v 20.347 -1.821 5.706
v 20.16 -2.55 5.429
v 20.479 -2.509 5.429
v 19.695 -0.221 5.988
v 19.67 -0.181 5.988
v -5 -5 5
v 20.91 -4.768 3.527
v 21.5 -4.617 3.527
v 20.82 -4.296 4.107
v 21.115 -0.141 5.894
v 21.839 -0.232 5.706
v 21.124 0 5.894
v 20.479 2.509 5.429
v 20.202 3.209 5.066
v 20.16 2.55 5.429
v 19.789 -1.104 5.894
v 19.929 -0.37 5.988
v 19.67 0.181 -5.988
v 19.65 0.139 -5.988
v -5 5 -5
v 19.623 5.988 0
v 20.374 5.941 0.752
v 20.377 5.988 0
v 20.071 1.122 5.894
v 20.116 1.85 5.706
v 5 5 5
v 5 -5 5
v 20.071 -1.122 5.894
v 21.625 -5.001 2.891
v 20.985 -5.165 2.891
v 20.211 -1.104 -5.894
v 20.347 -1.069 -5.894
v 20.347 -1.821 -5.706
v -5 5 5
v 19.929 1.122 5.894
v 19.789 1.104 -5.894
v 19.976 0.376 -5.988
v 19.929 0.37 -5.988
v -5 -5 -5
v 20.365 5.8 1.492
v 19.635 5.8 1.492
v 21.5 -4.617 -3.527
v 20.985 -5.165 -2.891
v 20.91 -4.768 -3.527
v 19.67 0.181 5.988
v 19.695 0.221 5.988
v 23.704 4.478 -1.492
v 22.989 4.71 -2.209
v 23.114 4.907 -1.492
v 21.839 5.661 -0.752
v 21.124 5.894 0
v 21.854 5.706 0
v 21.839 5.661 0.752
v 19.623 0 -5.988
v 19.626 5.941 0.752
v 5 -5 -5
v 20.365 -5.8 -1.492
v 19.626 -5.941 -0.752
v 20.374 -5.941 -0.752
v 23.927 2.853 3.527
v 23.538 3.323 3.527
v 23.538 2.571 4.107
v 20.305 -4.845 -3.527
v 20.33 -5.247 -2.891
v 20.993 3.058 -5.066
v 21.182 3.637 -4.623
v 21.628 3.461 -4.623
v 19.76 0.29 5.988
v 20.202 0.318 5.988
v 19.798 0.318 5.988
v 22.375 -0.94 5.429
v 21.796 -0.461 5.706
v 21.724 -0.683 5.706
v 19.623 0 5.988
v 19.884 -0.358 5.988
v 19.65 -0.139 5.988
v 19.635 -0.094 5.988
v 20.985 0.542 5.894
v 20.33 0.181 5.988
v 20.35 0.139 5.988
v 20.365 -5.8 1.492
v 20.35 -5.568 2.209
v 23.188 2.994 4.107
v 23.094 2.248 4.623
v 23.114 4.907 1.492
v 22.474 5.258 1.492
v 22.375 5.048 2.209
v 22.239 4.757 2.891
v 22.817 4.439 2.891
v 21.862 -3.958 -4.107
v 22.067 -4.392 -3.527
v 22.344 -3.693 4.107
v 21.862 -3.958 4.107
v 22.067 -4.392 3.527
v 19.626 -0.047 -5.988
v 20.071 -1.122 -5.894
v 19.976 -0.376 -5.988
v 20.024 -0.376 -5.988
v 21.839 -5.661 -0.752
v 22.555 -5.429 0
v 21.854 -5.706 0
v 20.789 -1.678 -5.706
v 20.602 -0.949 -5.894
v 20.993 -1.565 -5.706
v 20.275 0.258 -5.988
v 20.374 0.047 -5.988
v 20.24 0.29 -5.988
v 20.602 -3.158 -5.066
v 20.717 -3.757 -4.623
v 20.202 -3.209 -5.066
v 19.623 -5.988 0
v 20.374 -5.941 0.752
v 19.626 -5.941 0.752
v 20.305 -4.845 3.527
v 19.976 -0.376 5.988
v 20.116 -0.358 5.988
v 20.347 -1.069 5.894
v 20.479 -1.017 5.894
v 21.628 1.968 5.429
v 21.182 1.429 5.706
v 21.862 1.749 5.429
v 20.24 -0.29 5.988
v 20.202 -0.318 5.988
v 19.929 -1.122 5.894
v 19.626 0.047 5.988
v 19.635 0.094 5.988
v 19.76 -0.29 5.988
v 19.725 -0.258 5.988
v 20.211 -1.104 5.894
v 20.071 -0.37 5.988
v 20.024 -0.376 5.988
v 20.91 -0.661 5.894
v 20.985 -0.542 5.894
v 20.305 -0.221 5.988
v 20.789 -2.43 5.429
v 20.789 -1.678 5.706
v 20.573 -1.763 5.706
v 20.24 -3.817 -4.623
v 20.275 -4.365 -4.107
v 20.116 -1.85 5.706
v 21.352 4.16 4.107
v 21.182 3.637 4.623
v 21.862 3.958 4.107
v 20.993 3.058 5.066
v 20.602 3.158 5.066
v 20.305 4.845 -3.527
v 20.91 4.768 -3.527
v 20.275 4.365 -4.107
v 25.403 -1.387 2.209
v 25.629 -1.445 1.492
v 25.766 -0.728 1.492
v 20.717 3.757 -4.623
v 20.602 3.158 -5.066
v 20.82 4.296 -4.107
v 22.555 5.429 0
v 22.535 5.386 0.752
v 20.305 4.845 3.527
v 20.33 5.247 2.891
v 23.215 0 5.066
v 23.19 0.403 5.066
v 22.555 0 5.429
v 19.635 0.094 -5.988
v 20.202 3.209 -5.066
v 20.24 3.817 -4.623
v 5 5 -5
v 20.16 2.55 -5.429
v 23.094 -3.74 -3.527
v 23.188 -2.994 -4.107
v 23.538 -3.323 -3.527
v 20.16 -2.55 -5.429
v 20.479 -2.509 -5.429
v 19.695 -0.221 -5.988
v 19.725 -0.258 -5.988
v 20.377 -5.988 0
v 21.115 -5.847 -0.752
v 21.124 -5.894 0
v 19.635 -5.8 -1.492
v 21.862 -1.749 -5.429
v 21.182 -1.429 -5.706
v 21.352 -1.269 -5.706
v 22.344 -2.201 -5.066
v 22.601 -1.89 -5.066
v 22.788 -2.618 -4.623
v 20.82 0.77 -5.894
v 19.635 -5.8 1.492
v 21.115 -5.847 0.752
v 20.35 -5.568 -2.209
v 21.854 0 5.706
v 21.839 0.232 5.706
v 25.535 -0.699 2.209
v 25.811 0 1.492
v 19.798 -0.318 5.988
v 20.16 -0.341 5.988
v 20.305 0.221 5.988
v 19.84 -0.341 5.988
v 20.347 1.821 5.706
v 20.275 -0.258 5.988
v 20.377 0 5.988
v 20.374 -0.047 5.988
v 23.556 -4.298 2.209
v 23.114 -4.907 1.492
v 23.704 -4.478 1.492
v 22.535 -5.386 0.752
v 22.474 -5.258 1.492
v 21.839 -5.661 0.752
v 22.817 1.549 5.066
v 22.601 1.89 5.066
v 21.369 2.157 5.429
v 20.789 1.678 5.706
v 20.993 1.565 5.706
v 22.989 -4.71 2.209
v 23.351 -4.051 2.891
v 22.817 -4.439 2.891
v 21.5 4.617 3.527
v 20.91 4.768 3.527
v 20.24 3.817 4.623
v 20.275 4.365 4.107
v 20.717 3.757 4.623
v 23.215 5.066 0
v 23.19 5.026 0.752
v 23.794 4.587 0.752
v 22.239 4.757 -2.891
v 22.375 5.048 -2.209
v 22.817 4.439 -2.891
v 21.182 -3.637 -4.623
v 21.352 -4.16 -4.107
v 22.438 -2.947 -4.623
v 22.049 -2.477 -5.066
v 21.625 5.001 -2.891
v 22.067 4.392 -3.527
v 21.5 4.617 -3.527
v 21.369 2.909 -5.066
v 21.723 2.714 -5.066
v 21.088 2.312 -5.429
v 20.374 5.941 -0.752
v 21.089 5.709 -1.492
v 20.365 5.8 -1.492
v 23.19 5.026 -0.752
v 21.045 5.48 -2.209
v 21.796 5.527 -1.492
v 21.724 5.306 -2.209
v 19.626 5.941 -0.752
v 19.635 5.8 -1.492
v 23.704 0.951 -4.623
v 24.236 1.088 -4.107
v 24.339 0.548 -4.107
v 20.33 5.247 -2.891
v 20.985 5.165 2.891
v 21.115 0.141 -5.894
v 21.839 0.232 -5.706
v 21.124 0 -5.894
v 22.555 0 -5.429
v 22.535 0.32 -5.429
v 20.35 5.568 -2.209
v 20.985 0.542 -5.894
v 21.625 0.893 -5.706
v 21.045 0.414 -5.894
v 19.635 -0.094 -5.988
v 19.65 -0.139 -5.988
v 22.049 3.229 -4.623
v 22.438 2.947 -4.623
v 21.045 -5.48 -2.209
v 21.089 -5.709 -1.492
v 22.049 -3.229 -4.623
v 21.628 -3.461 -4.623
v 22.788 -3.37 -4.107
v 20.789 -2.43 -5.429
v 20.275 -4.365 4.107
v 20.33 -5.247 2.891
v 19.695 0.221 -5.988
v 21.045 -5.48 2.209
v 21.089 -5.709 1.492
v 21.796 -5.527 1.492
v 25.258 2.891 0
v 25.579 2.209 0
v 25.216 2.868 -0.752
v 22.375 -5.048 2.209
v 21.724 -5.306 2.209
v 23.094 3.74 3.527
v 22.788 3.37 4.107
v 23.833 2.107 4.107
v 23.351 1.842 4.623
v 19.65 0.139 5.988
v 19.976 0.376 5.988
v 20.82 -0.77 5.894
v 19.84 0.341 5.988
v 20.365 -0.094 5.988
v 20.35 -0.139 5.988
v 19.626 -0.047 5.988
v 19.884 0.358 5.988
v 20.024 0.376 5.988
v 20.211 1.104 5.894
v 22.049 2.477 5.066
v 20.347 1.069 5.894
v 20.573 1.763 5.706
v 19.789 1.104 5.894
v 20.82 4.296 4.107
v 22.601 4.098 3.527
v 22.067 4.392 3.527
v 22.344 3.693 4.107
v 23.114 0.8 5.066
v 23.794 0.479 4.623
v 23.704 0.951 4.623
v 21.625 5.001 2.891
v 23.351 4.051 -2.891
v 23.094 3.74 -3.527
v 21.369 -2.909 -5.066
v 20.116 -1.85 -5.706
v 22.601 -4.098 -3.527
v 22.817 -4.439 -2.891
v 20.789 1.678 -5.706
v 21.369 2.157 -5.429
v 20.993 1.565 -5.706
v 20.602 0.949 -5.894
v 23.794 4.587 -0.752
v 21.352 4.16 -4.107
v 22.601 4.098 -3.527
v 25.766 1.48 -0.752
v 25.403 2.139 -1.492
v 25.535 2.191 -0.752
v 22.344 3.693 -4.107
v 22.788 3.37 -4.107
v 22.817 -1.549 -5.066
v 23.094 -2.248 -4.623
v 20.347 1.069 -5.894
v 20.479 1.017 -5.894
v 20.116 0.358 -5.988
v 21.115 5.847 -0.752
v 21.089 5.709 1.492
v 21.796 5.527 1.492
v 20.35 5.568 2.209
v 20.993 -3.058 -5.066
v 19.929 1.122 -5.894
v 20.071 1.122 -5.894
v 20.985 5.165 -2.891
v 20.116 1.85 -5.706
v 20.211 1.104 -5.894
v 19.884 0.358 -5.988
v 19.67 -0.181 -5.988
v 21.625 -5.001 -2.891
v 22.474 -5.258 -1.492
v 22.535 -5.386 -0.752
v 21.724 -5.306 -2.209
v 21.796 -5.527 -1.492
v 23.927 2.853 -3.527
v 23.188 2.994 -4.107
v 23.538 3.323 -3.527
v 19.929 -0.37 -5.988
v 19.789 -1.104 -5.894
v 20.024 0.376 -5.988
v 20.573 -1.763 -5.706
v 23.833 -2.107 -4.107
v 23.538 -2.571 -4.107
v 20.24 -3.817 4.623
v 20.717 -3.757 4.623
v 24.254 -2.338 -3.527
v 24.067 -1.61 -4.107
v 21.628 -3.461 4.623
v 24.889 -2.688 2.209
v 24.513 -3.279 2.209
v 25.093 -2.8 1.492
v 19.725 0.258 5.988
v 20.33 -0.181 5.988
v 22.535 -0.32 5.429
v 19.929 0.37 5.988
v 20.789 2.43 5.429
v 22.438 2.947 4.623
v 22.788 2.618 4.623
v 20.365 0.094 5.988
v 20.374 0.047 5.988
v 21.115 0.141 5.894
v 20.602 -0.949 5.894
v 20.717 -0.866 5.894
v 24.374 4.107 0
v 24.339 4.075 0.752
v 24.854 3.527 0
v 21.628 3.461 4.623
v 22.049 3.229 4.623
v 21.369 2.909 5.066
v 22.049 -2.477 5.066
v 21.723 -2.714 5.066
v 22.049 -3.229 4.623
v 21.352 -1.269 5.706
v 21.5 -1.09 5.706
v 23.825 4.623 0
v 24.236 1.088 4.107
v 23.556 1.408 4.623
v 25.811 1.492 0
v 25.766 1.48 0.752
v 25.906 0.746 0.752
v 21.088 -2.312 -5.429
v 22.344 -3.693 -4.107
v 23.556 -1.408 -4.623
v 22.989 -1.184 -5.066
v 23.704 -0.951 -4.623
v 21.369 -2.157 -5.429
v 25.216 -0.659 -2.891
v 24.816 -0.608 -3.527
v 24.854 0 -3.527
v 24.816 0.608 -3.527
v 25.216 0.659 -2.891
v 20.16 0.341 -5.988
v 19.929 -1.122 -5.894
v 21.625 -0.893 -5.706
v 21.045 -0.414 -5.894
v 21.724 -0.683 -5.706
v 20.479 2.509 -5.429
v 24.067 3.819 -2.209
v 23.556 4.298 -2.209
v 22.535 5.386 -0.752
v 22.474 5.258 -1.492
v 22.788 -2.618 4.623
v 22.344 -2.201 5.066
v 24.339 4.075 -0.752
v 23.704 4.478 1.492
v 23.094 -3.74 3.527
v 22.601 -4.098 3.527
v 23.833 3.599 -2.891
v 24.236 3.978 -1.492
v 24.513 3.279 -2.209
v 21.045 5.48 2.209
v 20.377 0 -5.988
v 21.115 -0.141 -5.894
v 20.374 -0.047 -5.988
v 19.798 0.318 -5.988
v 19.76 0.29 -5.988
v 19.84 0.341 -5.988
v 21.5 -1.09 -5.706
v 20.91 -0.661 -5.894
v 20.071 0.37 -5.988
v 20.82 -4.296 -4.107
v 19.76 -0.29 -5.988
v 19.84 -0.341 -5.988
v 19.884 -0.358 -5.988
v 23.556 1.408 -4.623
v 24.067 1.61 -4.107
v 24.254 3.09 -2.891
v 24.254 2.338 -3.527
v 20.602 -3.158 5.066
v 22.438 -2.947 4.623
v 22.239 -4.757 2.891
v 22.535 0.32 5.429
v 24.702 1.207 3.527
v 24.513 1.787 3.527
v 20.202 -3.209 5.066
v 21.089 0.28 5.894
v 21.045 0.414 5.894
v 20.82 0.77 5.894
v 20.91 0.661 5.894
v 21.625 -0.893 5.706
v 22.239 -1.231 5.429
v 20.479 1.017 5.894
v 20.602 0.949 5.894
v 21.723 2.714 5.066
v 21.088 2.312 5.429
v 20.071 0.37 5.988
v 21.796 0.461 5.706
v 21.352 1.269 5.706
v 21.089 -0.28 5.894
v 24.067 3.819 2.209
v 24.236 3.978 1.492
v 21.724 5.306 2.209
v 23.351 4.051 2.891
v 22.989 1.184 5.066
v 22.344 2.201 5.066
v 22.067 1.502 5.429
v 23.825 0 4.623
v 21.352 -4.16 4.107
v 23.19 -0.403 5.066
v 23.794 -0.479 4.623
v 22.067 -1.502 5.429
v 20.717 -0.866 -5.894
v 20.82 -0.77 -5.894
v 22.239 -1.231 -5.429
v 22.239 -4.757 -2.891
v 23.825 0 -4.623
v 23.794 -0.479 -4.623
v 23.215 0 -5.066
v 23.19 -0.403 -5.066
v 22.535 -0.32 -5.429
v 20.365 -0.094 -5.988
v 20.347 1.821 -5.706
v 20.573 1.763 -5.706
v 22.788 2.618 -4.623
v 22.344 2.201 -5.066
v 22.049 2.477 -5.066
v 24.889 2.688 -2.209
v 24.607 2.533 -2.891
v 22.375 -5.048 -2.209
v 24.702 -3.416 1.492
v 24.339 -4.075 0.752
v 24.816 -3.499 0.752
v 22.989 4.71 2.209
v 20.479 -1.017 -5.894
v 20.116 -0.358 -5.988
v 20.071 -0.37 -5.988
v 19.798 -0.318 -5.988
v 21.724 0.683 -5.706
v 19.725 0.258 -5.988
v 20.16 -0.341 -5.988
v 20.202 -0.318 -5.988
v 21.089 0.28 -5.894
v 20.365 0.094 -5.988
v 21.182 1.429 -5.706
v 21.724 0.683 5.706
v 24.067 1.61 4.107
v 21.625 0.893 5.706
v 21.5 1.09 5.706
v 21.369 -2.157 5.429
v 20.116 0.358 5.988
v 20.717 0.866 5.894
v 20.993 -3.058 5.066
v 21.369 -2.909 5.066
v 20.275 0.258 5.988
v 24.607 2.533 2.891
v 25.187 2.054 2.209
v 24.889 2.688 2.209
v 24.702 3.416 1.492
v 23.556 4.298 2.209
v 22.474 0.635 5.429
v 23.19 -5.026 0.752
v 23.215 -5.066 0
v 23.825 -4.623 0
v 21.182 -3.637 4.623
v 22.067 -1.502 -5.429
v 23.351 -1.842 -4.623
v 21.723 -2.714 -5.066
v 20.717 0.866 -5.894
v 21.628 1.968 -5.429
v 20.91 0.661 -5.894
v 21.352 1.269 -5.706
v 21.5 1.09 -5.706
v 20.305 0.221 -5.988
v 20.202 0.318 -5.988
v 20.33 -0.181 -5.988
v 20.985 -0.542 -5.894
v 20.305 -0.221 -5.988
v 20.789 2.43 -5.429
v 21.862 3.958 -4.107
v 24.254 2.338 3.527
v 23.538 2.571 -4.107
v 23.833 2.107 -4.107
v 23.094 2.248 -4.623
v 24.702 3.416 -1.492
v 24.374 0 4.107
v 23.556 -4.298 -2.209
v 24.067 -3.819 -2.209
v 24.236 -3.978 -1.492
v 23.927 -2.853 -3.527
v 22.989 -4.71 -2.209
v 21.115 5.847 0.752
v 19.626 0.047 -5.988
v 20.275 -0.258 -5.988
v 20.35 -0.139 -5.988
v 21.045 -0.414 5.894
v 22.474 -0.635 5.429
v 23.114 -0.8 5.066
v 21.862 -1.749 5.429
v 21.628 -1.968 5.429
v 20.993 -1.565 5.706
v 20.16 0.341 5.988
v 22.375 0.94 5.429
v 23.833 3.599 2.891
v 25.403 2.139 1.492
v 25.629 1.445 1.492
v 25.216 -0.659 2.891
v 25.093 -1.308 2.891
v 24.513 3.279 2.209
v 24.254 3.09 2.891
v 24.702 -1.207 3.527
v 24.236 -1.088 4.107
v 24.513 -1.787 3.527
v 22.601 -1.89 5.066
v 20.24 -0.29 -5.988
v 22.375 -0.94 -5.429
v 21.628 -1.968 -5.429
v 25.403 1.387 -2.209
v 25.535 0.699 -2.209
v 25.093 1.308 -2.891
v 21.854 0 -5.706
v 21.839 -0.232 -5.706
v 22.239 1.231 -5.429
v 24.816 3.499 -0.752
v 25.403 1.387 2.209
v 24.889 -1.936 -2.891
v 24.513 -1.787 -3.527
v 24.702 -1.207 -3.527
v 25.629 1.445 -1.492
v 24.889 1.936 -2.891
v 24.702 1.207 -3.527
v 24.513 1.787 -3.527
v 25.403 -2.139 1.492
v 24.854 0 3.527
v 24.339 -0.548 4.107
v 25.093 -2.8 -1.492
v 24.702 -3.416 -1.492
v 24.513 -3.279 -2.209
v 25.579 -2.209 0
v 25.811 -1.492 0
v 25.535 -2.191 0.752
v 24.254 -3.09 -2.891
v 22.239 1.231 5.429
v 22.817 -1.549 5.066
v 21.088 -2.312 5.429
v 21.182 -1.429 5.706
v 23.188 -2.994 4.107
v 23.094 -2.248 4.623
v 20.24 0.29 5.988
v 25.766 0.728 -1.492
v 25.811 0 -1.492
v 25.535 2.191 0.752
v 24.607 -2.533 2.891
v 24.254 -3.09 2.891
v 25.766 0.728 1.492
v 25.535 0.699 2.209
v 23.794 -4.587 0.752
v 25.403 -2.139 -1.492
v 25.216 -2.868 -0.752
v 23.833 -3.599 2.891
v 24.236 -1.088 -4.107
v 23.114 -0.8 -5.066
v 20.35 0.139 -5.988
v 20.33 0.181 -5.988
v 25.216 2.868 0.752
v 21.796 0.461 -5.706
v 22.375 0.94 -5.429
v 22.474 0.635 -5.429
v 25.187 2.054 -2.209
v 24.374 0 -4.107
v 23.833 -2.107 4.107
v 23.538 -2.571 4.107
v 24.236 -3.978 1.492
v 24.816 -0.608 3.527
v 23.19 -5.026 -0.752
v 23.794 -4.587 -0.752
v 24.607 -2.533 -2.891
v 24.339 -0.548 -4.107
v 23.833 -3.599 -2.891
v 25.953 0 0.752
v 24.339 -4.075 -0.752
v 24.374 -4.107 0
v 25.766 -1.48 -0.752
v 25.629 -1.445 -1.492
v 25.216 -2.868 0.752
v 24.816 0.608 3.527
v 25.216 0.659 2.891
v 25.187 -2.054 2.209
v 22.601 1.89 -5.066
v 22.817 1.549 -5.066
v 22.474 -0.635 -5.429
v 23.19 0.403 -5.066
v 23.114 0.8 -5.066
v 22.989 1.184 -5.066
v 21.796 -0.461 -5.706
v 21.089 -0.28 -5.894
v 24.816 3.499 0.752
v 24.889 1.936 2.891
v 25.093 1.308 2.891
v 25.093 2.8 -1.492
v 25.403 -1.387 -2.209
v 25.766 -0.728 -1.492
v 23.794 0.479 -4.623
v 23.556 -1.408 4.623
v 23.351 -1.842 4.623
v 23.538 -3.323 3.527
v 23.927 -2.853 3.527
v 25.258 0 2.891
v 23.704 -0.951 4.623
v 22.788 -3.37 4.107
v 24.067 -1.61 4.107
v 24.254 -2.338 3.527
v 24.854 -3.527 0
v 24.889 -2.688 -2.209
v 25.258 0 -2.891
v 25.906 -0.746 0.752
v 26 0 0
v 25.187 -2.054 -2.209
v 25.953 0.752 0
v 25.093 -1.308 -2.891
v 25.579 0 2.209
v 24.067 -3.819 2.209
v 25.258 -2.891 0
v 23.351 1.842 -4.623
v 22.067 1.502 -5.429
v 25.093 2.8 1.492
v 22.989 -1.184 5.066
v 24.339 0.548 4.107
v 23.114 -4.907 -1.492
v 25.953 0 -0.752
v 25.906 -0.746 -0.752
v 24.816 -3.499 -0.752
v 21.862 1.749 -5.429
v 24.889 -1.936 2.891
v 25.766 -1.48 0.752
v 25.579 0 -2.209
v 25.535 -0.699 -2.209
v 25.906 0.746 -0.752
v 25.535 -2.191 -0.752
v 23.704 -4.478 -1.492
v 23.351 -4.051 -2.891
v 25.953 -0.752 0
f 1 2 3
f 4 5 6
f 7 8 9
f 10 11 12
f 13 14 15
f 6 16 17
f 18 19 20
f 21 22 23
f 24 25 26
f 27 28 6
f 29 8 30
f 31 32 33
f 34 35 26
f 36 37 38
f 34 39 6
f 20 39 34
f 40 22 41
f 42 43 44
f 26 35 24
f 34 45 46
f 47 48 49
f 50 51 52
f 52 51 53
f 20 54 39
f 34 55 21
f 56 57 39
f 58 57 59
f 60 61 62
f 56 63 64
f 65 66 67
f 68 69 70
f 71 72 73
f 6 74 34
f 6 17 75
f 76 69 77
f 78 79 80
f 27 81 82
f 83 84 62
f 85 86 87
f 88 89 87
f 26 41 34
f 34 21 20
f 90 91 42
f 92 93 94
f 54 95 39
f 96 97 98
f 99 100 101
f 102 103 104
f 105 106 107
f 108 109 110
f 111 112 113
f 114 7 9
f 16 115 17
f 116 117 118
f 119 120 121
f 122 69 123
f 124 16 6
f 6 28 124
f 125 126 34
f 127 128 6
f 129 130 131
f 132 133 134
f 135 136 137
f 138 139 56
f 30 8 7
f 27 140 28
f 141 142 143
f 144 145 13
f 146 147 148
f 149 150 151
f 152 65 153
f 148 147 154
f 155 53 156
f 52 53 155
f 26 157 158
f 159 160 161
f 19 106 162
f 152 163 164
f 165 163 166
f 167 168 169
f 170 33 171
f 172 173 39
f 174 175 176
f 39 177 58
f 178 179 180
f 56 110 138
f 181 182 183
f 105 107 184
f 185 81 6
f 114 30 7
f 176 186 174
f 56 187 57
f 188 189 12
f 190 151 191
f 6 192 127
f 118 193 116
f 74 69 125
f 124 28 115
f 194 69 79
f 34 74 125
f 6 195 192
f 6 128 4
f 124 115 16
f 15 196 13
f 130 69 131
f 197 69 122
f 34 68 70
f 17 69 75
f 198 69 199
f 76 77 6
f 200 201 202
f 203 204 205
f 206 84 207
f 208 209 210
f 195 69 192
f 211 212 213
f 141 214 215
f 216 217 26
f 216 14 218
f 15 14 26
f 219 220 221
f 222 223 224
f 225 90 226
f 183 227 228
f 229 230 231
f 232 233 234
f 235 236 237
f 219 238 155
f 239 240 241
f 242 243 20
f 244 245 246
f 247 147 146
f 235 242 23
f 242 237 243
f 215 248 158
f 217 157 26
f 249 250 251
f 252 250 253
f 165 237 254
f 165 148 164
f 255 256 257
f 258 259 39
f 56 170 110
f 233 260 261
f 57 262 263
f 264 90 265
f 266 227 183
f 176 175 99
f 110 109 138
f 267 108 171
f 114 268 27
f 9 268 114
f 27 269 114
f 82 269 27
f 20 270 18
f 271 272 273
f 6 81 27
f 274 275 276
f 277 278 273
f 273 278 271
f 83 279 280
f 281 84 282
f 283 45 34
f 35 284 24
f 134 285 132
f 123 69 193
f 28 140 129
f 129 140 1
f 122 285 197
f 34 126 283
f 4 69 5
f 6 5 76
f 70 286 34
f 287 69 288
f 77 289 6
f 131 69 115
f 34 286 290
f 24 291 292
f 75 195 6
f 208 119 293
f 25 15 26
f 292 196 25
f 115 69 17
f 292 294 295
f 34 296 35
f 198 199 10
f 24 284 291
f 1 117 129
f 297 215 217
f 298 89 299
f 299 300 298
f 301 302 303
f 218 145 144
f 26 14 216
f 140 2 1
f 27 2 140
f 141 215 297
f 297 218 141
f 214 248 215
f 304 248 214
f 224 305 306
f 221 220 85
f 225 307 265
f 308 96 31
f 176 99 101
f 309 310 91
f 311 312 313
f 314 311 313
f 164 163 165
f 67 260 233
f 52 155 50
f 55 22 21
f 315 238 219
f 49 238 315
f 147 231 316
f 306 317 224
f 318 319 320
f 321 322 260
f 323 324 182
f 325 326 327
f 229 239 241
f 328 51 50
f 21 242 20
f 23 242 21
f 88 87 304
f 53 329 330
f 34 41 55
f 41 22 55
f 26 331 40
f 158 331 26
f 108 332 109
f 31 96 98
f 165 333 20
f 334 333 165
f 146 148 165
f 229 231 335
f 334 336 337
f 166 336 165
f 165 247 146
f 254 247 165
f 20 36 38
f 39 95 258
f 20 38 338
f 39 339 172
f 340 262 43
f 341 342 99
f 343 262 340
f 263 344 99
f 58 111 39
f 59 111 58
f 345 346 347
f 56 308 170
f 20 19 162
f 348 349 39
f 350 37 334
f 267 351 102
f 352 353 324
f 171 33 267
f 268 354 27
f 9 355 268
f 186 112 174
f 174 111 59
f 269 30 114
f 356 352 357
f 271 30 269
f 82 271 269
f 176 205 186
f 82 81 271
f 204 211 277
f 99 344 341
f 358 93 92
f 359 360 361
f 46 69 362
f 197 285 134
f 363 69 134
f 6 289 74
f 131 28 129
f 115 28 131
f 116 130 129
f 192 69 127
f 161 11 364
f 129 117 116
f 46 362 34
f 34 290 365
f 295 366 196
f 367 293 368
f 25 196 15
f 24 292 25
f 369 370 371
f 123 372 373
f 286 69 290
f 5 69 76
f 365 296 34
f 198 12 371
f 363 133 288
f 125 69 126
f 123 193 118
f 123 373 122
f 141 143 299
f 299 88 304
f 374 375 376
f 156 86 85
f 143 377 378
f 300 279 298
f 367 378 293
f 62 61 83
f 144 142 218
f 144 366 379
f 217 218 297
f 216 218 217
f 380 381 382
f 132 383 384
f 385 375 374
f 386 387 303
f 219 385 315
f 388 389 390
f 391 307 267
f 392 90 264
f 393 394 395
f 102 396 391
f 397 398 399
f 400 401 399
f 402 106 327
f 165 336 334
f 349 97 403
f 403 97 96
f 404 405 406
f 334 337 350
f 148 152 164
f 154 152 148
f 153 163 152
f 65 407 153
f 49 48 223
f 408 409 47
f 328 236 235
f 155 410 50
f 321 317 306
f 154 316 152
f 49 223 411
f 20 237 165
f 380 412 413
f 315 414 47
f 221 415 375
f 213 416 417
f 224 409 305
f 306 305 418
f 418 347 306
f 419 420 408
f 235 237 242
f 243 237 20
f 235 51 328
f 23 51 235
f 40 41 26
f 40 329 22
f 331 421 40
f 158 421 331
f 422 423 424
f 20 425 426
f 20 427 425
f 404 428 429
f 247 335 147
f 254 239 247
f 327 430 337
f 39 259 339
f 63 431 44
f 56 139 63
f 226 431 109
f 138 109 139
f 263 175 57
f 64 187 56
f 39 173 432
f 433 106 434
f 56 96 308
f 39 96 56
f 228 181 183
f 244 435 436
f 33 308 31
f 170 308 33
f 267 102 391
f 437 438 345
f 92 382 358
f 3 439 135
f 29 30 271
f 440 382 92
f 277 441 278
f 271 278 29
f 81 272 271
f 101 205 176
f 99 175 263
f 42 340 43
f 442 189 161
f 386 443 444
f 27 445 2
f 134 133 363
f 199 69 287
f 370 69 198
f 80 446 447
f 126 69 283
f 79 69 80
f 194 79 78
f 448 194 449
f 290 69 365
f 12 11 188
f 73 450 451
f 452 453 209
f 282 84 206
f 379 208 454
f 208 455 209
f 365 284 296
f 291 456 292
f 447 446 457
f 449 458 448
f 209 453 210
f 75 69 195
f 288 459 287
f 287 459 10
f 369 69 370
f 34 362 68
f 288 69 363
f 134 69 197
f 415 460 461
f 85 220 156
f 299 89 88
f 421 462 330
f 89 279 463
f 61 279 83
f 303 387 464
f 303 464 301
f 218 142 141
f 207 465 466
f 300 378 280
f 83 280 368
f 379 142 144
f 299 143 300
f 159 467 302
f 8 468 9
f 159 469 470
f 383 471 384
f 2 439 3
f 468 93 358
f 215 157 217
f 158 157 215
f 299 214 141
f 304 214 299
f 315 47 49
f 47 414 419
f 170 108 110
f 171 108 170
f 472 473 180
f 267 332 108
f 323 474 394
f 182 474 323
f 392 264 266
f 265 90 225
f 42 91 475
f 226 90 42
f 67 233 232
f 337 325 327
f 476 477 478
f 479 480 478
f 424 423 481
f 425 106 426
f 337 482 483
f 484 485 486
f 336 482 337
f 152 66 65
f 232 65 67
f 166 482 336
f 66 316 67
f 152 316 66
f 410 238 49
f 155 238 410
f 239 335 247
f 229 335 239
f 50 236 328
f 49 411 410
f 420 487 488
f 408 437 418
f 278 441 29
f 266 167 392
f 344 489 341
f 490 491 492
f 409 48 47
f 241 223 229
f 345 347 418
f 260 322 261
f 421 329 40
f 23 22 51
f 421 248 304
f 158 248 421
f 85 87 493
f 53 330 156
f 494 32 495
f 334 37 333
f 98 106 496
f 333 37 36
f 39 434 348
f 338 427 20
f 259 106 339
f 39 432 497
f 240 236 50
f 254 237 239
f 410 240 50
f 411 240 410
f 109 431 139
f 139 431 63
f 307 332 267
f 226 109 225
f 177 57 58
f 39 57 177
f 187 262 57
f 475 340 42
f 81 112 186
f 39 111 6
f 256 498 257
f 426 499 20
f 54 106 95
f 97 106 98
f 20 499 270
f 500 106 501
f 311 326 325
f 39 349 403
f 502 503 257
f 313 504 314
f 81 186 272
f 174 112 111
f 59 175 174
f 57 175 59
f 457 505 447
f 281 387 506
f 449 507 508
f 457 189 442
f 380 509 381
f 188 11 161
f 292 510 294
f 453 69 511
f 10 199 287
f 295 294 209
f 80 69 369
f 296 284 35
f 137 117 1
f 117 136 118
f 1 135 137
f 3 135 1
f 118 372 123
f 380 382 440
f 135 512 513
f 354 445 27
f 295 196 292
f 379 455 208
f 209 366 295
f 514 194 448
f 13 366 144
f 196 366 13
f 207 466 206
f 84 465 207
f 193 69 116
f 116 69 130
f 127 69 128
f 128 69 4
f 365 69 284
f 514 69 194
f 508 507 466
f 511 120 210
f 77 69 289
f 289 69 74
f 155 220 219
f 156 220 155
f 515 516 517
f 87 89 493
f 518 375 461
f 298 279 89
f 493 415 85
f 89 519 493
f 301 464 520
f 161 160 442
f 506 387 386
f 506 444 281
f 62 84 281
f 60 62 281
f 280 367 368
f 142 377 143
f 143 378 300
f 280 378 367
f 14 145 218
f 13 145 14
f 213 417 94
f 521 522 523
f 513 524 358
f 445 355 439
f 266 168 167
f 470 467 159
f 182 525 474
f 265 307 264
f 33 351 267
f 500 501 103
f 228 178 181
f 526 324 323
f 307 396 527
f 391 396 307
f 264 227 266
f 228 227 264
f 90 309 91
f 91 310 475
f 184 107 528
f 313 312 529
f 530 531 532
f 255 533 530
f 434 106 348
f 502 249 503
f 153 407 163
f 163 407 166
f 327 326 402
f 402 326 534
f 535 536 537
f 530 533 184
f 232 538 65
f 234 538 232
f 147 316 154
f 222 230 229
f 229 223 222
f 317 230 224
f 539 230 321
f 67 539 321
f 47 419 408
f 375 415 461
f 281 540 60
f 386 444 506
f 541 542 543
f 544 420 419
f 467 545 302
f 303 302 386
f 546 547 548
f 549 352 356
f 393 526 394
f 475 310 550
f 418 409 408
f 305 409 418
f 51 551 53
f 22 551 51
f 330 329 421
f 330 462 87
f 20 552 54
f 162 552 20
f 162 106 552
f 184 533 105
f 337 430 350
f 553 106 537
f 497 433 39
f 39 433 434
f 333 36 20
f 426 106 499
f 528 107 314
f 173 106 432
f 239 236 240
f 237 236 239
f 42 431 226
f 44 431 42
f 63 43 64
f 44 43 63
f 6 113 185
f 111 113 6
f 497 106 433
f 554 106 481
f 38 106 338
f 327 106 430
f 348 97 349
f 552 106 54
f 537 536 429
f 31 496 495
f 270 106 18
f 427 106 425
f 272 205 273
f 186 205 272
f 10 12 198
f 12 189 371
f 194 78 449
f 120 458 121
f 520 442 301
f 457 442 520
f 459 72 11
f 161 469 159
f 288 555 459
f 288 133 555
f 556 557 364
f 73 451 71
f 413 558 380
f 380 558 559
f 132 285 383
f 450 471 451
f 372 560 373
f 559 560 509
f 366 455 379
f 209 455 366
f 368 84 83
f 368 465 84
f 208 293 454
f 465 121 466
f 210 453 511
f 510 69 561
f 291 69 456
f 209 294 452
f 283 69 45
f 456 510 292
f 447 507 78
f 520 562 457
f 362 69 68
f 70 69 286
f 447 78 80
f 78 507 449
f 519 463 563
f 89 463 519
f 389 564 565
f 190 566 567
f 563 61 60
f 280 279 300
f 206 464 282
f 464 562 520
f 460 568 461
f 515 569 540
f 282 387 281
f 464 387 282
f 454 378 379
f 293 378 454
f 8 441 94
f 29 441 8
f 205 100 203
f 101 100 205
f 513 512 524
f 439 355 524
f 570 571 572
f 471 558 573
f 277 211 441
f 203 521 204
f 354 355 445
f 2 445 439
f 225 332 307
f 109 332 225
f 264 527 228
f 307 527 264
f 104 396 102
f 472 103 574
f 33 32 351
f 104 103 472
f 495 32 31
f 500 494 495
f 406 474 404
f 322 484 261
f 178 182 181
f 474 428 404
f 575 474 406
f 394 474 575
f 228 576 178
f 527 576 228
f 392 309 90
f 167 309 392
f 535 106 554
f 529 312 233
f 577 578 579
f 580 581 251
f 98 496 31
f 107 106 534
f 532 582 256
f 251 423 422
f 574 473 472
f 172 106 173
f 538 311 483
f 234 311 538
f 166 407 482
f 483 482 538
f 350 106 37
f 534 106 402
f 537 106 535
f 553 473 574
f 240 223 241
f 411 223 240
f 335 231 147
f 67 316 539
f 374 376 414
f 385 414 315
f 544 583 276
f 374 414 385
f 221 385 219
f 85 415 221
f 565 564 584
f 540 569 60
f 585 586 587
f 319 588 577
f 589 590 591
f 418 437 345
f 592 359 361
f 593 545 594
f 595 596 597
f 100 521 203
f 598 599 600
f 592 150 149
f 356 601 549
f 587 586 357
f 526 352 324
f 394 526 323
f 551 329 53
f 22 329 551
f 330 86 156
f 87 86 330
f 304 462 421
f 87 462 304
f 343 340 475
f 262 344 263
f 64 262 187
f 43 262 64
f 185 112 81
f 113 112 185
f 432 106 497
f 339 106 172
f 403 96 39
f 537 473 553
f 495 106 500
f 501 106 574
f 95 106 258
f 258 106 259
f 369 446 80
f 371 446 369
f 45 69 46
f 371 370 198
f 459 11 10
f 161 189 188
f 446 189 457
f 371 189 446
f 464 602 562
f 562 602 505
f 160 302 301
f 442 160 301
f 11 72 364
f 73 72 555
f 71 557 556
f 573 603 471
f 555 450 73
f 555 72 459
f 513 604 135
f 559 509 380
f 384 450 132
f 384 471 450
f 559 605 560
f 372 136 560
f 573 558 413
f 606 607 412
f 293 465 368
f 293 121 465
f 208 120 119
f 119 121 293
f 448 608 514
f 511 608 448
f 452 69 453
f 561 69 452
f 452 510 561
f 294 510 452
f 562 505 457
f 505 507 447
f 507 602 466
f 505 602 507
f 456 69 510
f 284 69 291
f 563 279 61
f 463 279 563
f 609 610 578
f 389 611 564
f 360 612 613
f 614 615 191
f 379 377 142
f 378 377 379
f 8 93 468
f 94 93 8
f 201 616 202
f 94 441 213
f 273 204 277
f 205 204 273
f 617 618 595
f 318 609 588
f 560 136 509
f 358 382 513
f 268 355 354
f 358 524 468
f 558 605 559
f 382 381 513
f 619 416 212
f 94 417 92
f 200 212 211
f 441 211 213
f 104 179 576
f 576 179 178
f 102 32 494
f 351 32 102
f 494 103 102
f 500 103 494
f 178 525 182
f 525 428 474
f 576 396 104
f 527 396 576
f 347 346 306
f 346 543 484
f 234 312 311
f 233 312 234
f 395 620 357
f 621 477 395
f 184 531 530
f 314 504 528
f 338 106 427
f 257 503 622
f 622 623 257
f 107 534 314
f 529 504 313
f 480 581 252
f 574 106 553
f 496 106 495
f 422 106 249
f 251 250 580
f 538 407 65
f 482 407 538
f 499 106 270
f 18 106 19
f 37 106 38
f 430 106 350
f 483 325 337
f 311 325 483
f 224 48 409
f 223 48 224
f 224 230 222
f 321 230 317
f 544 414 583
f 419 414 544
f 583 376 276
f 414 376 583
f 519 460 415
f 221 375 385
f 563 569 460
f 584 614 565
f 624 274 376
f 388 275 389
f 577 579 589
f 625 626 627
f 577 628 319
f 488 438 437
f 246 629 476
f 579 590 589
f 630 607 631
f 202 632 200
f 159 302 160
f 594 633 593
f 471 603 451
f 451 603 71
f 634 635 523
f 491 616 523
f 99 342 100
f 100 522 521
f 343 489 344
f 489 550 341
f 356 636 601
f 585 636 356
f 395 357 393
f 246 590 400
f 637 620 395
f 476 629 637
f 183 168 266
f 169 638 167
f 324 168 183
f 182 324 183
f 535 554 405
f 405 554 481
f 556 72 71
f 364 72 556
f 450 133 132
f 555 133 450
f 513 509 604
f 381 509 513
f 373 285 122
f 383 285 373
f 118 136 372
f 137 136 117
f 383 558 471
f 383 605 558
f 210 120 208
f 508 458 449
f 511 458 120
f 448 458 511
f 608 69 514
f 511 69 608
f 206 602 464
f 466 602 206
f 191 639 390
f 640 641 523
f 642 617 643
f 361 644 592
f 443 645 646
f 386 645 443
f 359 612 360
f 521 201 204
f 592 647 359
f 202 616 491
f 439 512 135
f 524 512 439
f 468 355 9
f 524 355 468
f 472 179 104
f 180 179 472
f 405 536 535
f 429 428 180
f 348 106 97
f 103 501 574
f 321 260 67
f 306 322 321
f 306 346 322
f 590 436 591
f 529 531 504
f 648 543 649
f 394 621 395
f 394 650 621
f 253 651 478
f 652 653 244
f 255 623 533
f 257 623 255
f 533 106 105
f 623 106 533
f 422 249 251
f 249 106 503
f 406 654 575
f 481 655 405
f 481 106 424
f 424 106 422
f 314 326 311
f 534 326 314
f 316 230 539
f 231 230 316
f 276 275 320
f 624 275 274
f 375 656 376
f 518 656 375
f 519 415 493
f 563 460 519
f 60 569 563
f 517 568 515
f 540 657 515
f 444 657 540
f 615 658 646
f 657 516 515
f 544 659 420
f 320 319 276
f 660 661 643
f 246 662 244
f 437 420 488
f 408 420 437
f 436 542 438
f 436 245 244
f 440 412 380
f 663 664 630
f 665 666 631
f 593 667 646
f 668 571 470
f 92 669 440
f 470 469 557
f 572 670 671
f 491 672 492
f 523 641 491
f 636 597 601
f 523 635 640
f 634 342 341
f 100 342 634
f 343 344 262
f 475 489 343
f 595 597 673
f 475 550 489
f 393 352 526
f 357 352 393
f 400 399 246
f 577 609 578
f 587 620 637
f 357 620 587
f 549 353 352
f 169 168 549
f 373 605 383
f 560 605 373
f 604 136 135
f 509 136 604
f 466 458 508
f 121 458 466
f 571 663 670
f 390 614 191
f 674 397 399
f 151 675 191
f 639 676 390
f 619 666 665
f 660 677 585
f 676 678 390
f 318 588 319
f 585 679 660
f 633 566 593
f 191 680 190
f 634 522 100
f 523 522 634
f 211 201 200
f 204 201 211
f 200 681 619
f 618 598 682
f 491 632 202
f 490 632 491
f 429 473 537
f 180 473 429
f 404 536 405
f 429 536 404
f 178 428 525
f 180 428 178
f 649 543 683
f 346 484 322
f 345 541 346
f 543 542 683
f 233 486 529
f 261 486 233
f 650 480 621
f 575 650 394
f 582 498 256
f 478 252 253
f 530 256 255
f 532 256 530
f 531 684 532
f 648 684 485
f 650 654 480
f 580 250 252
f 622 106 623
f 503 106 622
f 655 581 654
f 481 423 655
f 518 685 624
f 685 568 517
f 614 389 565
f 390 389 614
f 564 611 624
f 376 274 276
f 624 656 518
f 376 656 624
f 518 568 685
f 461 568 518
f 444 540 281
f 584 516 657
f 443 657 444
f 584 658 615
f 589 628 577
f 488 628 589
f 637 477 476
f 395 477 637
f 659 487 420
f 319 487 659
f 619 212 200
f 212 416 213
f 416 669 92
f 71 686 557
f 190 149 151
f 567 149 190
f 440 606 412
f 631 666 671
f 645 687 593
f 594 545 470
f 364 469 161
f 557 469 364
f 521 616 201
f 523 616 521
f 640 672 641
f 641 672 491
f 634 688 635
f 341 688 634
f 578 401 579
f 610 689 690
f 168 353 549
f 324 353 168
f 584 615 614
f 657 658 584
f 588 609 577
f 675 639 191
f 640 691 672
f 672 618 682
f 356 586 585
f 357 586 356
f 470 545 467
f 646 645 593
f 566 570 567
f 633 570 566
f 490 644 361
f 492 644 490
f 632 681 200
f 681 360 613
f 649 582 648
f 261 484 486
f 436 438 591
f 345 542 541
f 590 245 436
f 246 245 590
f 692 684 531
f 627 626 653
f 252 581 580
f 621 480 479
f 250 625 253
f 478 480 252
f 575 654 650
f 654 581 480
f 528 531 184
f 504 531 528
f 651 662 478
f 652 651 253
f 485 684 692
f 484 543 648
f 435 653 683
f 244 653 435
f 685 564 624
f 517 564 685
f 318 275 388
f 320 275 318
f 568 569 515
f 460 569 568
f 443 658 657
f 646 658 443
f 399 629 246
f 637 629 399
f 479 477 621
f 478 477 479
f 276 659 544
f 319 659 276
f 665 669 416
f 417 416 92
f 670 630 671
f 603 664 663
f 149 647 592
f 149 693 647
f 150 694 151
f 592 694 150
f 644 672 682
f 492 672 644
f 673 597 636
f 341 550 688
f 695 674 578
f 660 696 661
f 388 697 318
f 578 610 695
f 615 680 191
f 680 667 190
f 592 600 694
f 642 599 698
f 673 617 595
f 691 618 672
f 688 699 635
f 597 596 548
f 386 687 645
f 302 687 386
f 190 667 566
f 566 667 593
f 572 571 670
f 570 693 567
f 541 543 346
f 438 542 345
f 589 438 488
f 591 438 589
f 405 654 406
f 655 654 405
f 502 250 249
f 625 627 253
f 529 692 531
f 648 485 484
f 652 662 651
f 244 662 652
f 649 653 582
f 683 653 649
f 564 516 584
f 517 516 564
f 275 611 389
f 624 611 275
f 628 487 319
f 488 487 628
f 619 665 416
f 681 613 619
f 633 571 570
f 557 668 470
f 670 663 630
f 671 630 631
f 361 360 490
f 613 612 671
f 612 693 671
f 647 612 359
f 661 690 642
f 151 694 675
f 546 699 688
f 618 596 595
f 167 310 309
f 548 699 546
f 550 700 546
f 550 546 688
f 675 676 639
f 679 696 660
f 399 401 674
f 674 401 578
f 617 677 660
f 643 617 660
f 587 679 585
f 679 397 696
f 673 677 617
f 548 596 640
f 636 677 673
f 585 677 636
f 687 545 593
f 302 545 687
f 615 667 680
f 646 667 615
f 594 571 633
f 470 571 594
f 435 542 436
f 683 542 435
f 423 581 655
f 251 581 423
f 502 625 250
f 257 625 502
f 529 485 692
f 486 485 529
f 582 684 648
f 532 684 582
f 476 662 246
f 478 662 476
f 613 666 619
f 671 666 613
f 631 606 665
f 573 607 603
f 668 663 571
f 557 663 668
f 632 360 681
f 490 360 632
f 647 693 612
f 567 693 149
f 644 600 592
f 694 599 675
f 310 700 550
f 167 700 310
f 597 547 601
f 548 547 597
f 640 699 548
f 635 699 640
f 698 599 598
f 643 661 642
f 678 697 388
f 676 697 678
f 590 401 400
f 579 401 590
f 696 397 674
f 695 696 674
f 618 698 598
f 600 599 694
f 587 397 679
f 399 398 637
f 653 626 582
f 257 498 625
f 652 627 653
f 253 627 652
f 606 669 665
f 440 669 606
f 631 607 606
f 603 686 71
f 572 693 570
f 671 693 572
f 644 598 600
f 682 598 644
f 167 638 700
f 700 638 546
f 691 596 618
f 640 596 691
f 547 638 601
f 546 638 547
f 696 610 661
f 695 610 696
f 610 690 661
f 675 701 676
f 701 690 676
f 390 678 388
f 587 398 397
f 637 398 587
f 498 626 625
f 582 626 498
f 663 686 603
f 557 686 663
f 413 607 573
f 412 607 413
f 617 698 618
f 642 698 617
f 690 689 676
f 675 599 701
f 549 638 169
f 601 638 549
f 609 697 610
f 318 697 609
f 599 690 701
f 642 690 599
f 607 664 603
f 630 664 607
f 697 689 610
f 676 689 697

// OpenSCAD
//cube(10);
//cube([10,20,3]);//Denne kuben er x = 10, y = 20, z  =3
/*
Laaaaang kommentar
Over flere linjer
*/
 
//translate([30,0,0]) rotate([10,0,0]) cylinder(10,5,0,$fn=3);
 
 
a1 = 6;
dim1 = 10;
 
/*translate([40,40,0]) {
    sphere(r=a1,$fn = 50);
    cube(dim1,center = true);
}*/
 
//union
/*union() sphere(r=a1,$fn = 50); cube(dim1,center = true);
*/
//difference
/*difference() {
    cube(dim1,center = true); 
    sphere(r=a1,$fn = 50);
}*/
 
/*difference() {    
    sphere(r=a1,$fn = 50);
    cube(dim1,center = true); 
}*/
 
/*intersection() {    
    sphere(r=a1,$fn = 50);
    cube(dim1,center = true); 
}*/
 
/*intersection() {    
    cube(dim1,center = true); 
       sphere(r=a1,$fn = 50);
}*/
 
/*minkowski() {
    cube(dim1,center = true); 
    translate([20,0,0]) sphere(r=a1,$fn = 50);
}*/
 
/*hull() {
    cube(dim1,center = true); 
    translate([20,0,0]) sphere(r=a1,$fn = 50);
}*/
 
 
module name_of_module(input1=10, input2=10) {
hull() {
    cube(dim1,center = true); 
    translate([20,0,0]) sphere(r=a1,$fn = 50);
    }   
}
 
name_of_module();
 
//function()
